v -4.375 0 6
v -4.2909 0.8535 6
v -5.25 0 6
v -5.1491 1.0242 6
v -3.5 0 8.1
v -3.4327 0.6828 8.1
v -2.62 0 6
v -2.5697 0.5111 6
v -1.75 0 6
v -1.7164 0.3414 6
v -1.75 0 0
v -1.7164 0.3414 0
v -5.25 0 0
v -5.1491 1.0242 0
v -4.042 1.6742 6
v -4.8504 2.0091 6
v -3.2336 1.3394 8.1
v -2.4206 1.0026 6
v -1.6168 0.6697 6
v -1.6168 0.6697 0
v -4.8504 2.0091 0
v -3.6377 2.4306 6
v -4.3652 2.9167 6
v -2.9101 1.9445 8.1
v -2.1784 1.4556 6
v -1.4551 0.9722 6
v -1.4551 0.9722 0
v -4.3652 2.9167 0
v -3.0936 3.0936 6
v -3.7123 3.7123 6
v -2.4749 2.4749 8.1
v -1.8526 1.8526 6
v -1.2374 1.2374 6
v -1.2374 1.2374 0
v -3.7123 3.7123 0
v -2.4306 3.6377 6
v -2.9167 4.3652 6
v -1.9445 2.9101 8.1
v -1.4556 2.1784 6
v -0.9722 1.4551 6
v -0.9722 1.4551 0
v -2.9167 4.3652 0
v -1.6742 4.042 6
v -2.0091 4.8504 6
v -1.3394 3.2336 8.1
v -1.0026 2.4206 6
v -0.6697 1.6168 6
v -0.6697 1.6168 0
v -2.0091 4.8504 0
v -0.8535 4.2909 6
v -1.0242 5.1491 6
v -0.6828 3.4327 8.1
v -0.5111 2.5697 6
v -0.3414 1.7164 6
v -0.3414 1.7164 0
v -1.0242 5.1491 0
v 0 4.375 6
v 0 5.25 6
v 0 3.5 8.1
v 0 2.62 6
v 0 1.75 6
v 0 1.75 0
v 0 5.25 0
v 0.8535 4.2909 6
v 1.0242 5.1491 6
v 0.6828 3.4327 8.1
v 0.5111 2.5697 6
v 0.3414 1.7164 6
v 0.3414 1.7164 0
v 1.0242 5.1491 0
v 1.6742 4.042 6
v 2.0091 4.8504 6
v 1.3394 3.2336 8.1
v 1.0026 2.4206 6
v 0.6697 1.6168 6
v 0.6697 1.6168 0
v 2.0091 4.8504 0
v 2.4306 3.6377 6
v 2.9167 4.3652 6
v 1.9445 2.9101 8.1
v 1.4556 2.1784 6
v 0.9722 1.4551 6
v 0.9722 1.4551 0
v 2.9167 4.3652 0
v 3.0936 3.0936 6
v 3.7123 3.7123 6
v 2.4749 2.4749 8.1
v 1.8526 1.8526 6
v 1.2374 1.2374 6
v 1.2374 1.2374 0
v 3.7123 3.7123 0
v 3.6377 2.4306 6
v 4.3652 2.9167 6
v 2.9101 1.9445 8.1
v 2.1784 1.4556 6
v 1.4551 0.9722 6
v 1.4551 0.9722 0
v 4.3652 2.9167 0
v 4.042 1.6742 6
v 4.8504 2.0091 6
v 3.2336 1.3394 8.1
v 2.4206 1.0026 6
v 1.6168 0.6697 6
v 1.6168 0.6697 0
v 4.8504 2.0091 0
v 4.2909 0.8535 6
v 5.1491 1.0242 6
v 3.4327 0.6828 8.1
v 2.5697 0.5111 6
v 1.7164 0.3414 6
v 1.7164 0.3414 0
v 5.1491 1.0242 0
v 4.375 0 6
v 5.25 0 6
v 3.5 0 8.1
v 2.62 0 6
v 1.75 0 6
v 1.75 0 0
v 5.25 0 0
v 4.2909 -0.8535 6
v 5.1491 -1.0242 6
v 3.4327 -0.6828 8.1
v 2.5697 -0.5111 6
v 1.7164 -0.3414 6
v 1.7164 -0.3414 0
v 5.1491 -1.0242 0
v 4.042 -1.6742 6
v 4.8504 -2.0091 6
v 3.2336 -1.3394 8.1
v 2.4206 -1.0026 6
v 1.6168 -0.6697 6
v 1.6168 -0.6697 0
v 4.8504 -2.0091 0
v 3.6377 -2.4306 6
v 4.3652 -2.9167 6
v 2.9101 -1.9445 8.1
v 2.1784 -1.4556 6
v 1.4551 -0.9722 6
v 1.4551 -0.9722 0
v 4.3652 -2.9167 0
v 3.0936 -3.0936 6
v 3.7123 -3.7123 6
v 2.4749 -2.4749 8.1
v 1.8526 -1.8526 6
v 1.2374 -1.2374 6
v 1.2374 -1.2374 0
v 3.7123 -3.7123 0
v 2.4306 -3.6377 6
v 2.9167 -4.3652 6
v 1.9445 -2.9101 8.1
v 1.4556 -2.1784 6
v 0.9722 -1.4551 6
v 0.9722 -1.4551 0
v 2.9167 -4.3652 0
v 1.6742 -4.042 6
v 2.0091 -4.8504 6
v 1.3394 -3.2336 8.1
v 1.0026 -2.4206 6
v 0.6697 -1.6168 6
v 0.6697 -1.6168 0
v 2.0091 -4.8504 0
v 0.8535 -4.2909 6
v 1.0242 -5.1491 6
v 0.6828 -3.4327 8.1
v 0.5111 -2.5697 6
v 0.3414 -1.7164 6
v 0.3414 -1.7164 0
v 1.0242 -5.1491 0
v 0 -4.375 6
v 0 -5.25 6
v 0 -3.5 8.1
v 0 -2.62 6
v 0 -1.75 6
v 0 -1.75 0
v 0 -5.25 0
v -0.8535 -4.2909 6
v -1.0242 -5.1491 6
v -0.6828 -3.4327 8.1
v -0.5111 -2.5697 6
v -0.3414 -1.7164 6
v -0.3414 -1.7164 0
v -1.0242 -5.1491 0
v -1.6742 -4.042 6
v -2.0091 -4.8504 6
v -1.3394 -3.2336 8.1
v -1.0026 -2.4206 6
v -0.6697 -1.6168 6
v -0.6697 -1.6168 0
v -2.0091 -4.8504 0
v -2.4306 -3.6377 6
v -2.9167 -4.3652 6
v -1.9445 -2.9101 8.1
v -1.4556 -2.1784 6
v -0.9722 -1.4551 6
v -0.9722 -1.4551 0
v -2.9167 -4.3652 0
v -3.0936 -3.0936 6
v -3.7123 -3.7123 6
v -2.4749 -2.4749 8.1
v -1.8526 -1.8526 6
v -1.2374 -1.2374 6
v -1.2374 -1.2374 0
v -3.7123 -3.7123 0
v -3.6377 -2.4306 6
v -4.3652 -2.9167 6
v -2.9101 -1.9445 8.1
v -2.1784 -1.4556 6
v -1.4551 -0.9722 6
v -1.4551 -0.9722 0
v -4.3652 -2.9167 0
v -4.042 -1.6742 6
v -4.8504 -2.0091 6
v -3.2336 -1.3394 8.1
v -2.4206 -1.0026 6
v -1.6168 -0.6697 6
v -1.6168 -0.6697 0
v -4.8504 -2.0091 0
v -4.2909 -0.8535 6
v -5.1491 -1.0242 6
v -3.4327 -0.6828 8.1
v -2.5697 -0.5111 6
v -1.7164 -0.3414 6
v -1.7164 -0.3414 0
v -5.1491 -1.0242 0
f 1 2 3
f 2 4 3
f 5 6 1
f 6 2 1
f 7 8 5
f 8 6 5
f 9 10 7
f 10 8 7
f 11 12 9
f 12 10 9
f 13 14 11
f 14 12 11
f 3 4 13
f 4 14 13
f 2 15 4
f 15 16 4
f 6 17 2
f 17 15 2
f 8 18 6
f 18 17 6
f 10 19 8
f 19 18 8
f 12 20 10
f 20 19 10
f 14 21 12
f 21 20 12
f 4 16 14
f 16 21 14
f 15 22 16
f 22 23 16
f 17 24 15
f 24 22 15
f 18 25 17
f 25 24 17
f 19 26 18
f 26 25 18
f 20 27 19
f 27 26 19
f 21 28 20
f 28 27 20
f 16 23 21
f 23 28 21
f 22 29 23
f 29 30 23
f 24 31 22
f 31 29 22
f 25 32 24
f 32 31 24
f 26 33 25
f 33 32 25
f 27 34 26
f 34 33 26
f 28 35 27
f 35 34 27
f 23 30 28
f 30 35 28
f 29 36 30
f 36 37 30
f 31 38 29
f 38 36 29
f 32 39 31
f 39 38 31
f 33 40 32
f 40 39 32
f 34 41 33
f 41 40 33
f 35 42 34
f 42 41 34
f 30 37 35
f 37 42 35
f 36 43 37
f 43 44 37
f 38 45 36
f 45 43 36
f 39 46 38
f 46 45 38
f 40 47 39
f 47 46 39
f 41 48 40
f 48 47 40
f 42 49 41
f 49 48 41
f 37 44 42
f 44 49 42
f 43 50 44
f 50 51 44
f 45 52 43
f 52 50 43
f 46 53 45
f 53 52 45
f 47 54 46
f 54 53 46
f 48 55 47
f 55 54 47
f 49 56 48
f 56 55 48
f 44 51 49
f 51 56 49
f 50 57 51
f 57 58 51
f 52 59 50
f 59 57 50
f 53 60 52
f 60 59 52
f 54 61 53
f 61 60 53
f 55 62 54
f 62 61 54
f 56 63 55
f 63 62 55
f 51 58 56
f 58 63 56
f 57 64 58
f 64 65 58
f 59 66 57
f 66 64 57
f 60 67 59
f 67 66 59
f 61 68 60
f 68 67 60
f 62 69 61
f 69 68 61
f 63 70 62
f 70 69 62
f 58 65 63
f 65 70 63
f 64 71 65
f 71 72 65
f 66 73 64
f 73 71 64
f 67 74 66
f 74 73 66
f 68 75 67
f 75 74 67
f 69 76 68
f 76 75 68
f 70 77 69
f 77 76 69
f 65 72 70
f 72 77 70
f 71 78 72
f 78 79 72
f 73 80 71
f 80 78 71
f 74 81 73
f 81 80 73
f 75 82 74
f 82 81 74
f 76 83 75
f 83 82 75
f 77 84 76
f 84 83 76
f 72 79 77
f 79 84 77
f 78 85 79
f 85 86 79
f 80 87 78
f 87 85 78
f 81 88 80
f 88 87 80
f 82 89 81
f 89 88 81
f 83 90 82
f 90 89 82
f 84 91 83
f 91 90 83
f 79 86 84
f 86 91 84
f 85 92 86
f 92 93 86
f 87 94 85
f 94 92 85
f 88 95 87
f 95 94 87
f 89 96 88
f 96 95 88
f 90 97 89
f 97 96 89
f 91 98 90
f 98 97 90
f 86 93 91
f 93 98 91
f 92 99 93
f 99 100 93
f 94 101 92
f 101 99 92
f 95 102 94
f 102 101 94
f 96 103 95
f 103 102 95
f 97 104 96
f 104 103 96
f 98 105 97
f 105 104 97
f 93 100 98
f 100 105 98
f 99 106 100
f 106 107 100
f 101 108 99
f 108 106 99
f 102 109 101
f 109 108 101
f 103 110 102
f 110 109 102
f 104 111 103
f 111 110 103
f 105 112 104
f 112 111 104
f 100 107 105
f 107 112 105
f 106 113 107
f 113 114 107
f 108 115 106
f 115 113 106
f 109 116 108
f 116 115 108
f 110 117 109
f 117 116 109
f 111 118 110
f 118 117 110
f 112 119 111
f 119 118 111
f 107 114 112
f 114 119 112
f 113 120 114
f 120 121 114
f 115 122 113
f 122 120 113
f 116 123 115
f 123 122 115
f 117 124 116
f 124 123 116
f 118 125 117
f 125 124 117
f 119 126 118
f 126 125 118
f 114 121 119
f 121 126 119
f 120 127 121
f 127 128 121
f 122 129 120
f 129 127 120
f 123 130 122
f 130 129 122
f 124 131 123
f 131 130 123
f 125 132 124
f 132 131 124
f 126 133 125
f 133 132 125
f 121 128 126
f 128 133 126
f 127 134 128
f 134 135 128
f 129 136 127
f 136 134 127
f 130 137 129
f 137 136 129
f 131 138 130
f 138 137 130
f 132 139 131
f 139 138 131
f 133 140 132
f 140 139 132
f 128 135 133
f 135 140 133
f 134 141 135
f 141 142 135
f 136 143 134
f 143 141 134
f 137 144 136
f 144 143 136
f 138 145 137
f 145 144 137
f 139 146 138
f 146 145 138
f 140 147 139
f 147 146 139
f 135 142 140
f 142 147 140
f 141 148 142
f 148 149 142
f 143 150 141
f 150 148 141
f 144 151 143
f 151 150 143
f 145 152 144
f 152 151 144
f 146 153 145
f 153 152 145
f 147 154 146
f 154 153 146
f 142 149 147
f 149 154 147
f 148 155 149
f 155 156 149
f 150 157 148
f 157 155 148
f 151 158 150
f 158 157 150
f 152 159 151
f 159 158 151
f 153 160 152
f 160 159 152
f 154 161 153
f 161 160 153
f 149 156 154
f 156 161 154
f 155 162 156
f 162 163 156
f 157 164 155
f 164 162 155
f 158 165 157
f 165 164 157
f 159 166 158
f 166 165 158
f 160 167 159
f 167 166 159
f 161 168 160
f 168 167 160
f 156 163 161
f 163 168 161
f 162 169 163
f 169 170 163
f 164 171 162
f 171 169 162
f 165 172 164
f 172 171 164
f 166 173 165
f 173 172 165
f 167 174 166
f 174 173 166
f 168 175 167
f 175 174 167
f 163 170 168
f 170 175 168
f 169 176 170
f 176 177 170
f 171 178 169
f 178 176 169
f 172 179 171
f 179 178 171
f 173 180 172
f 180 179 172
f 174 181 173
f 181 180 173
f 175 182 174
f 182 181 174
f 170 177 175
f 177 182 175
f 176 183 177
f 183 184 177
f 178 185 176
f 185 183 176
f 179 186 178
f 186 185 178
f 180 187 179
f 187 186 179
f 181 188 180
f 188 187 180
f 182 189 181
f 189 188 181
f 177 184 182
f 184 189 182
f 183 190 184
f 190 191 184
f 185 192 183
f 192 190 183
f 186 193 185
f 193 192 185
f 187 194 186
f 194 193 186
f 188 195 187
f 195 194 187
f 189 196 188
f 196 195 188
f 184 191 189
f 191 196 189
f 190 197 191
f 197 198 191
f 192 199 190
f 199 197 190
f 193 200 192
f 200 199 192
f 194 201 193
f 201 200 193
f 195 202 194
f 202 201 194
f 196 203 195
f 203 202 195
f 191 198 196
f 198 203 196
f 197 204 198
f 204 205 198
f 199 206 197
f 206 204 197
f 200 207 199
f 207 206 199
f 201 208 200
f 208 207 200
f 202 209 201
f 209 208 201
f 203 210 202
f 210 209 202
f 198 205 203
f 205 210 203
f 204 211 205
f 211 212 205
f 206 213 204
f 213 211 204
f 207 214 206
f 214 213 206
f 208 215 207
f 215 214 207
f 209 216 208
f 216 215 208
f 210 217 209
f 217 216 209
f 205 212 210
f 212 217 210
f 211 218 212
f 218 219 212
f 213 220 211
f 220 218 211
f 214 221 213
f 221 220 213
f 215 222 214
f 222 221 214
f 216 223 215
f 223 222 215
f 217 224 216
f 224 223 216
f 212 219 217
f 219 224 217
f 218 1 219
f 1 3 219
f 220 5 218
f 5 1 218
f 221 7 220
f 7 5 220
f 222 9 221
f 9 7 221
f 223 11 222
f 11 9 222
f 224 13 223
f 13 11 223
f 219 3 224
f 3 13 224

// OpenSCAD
$fn = 32;

// ----------------------------------------------------------------------
// Form washer: domed washer, 10.5 mm outside, 3.5 mm bore
// ----------------------------------------------------------------------

// --- parameters (mm) ---
revolve_angle = 360;      // full turn around the Z axis
profile_points = 7;       // points of the closed outline

profile = [[1.75, 0], [5.25, 0], [5.25, 6], [4.375, 6], [3.5, 8.1], [2.62, 6], [1.75, 6]];  // single closed polygon, 7 points, counter clockwise

// --- the one profile operation ---
rotate_extrude(angle = revolve_angle) polygon(points = profile);
